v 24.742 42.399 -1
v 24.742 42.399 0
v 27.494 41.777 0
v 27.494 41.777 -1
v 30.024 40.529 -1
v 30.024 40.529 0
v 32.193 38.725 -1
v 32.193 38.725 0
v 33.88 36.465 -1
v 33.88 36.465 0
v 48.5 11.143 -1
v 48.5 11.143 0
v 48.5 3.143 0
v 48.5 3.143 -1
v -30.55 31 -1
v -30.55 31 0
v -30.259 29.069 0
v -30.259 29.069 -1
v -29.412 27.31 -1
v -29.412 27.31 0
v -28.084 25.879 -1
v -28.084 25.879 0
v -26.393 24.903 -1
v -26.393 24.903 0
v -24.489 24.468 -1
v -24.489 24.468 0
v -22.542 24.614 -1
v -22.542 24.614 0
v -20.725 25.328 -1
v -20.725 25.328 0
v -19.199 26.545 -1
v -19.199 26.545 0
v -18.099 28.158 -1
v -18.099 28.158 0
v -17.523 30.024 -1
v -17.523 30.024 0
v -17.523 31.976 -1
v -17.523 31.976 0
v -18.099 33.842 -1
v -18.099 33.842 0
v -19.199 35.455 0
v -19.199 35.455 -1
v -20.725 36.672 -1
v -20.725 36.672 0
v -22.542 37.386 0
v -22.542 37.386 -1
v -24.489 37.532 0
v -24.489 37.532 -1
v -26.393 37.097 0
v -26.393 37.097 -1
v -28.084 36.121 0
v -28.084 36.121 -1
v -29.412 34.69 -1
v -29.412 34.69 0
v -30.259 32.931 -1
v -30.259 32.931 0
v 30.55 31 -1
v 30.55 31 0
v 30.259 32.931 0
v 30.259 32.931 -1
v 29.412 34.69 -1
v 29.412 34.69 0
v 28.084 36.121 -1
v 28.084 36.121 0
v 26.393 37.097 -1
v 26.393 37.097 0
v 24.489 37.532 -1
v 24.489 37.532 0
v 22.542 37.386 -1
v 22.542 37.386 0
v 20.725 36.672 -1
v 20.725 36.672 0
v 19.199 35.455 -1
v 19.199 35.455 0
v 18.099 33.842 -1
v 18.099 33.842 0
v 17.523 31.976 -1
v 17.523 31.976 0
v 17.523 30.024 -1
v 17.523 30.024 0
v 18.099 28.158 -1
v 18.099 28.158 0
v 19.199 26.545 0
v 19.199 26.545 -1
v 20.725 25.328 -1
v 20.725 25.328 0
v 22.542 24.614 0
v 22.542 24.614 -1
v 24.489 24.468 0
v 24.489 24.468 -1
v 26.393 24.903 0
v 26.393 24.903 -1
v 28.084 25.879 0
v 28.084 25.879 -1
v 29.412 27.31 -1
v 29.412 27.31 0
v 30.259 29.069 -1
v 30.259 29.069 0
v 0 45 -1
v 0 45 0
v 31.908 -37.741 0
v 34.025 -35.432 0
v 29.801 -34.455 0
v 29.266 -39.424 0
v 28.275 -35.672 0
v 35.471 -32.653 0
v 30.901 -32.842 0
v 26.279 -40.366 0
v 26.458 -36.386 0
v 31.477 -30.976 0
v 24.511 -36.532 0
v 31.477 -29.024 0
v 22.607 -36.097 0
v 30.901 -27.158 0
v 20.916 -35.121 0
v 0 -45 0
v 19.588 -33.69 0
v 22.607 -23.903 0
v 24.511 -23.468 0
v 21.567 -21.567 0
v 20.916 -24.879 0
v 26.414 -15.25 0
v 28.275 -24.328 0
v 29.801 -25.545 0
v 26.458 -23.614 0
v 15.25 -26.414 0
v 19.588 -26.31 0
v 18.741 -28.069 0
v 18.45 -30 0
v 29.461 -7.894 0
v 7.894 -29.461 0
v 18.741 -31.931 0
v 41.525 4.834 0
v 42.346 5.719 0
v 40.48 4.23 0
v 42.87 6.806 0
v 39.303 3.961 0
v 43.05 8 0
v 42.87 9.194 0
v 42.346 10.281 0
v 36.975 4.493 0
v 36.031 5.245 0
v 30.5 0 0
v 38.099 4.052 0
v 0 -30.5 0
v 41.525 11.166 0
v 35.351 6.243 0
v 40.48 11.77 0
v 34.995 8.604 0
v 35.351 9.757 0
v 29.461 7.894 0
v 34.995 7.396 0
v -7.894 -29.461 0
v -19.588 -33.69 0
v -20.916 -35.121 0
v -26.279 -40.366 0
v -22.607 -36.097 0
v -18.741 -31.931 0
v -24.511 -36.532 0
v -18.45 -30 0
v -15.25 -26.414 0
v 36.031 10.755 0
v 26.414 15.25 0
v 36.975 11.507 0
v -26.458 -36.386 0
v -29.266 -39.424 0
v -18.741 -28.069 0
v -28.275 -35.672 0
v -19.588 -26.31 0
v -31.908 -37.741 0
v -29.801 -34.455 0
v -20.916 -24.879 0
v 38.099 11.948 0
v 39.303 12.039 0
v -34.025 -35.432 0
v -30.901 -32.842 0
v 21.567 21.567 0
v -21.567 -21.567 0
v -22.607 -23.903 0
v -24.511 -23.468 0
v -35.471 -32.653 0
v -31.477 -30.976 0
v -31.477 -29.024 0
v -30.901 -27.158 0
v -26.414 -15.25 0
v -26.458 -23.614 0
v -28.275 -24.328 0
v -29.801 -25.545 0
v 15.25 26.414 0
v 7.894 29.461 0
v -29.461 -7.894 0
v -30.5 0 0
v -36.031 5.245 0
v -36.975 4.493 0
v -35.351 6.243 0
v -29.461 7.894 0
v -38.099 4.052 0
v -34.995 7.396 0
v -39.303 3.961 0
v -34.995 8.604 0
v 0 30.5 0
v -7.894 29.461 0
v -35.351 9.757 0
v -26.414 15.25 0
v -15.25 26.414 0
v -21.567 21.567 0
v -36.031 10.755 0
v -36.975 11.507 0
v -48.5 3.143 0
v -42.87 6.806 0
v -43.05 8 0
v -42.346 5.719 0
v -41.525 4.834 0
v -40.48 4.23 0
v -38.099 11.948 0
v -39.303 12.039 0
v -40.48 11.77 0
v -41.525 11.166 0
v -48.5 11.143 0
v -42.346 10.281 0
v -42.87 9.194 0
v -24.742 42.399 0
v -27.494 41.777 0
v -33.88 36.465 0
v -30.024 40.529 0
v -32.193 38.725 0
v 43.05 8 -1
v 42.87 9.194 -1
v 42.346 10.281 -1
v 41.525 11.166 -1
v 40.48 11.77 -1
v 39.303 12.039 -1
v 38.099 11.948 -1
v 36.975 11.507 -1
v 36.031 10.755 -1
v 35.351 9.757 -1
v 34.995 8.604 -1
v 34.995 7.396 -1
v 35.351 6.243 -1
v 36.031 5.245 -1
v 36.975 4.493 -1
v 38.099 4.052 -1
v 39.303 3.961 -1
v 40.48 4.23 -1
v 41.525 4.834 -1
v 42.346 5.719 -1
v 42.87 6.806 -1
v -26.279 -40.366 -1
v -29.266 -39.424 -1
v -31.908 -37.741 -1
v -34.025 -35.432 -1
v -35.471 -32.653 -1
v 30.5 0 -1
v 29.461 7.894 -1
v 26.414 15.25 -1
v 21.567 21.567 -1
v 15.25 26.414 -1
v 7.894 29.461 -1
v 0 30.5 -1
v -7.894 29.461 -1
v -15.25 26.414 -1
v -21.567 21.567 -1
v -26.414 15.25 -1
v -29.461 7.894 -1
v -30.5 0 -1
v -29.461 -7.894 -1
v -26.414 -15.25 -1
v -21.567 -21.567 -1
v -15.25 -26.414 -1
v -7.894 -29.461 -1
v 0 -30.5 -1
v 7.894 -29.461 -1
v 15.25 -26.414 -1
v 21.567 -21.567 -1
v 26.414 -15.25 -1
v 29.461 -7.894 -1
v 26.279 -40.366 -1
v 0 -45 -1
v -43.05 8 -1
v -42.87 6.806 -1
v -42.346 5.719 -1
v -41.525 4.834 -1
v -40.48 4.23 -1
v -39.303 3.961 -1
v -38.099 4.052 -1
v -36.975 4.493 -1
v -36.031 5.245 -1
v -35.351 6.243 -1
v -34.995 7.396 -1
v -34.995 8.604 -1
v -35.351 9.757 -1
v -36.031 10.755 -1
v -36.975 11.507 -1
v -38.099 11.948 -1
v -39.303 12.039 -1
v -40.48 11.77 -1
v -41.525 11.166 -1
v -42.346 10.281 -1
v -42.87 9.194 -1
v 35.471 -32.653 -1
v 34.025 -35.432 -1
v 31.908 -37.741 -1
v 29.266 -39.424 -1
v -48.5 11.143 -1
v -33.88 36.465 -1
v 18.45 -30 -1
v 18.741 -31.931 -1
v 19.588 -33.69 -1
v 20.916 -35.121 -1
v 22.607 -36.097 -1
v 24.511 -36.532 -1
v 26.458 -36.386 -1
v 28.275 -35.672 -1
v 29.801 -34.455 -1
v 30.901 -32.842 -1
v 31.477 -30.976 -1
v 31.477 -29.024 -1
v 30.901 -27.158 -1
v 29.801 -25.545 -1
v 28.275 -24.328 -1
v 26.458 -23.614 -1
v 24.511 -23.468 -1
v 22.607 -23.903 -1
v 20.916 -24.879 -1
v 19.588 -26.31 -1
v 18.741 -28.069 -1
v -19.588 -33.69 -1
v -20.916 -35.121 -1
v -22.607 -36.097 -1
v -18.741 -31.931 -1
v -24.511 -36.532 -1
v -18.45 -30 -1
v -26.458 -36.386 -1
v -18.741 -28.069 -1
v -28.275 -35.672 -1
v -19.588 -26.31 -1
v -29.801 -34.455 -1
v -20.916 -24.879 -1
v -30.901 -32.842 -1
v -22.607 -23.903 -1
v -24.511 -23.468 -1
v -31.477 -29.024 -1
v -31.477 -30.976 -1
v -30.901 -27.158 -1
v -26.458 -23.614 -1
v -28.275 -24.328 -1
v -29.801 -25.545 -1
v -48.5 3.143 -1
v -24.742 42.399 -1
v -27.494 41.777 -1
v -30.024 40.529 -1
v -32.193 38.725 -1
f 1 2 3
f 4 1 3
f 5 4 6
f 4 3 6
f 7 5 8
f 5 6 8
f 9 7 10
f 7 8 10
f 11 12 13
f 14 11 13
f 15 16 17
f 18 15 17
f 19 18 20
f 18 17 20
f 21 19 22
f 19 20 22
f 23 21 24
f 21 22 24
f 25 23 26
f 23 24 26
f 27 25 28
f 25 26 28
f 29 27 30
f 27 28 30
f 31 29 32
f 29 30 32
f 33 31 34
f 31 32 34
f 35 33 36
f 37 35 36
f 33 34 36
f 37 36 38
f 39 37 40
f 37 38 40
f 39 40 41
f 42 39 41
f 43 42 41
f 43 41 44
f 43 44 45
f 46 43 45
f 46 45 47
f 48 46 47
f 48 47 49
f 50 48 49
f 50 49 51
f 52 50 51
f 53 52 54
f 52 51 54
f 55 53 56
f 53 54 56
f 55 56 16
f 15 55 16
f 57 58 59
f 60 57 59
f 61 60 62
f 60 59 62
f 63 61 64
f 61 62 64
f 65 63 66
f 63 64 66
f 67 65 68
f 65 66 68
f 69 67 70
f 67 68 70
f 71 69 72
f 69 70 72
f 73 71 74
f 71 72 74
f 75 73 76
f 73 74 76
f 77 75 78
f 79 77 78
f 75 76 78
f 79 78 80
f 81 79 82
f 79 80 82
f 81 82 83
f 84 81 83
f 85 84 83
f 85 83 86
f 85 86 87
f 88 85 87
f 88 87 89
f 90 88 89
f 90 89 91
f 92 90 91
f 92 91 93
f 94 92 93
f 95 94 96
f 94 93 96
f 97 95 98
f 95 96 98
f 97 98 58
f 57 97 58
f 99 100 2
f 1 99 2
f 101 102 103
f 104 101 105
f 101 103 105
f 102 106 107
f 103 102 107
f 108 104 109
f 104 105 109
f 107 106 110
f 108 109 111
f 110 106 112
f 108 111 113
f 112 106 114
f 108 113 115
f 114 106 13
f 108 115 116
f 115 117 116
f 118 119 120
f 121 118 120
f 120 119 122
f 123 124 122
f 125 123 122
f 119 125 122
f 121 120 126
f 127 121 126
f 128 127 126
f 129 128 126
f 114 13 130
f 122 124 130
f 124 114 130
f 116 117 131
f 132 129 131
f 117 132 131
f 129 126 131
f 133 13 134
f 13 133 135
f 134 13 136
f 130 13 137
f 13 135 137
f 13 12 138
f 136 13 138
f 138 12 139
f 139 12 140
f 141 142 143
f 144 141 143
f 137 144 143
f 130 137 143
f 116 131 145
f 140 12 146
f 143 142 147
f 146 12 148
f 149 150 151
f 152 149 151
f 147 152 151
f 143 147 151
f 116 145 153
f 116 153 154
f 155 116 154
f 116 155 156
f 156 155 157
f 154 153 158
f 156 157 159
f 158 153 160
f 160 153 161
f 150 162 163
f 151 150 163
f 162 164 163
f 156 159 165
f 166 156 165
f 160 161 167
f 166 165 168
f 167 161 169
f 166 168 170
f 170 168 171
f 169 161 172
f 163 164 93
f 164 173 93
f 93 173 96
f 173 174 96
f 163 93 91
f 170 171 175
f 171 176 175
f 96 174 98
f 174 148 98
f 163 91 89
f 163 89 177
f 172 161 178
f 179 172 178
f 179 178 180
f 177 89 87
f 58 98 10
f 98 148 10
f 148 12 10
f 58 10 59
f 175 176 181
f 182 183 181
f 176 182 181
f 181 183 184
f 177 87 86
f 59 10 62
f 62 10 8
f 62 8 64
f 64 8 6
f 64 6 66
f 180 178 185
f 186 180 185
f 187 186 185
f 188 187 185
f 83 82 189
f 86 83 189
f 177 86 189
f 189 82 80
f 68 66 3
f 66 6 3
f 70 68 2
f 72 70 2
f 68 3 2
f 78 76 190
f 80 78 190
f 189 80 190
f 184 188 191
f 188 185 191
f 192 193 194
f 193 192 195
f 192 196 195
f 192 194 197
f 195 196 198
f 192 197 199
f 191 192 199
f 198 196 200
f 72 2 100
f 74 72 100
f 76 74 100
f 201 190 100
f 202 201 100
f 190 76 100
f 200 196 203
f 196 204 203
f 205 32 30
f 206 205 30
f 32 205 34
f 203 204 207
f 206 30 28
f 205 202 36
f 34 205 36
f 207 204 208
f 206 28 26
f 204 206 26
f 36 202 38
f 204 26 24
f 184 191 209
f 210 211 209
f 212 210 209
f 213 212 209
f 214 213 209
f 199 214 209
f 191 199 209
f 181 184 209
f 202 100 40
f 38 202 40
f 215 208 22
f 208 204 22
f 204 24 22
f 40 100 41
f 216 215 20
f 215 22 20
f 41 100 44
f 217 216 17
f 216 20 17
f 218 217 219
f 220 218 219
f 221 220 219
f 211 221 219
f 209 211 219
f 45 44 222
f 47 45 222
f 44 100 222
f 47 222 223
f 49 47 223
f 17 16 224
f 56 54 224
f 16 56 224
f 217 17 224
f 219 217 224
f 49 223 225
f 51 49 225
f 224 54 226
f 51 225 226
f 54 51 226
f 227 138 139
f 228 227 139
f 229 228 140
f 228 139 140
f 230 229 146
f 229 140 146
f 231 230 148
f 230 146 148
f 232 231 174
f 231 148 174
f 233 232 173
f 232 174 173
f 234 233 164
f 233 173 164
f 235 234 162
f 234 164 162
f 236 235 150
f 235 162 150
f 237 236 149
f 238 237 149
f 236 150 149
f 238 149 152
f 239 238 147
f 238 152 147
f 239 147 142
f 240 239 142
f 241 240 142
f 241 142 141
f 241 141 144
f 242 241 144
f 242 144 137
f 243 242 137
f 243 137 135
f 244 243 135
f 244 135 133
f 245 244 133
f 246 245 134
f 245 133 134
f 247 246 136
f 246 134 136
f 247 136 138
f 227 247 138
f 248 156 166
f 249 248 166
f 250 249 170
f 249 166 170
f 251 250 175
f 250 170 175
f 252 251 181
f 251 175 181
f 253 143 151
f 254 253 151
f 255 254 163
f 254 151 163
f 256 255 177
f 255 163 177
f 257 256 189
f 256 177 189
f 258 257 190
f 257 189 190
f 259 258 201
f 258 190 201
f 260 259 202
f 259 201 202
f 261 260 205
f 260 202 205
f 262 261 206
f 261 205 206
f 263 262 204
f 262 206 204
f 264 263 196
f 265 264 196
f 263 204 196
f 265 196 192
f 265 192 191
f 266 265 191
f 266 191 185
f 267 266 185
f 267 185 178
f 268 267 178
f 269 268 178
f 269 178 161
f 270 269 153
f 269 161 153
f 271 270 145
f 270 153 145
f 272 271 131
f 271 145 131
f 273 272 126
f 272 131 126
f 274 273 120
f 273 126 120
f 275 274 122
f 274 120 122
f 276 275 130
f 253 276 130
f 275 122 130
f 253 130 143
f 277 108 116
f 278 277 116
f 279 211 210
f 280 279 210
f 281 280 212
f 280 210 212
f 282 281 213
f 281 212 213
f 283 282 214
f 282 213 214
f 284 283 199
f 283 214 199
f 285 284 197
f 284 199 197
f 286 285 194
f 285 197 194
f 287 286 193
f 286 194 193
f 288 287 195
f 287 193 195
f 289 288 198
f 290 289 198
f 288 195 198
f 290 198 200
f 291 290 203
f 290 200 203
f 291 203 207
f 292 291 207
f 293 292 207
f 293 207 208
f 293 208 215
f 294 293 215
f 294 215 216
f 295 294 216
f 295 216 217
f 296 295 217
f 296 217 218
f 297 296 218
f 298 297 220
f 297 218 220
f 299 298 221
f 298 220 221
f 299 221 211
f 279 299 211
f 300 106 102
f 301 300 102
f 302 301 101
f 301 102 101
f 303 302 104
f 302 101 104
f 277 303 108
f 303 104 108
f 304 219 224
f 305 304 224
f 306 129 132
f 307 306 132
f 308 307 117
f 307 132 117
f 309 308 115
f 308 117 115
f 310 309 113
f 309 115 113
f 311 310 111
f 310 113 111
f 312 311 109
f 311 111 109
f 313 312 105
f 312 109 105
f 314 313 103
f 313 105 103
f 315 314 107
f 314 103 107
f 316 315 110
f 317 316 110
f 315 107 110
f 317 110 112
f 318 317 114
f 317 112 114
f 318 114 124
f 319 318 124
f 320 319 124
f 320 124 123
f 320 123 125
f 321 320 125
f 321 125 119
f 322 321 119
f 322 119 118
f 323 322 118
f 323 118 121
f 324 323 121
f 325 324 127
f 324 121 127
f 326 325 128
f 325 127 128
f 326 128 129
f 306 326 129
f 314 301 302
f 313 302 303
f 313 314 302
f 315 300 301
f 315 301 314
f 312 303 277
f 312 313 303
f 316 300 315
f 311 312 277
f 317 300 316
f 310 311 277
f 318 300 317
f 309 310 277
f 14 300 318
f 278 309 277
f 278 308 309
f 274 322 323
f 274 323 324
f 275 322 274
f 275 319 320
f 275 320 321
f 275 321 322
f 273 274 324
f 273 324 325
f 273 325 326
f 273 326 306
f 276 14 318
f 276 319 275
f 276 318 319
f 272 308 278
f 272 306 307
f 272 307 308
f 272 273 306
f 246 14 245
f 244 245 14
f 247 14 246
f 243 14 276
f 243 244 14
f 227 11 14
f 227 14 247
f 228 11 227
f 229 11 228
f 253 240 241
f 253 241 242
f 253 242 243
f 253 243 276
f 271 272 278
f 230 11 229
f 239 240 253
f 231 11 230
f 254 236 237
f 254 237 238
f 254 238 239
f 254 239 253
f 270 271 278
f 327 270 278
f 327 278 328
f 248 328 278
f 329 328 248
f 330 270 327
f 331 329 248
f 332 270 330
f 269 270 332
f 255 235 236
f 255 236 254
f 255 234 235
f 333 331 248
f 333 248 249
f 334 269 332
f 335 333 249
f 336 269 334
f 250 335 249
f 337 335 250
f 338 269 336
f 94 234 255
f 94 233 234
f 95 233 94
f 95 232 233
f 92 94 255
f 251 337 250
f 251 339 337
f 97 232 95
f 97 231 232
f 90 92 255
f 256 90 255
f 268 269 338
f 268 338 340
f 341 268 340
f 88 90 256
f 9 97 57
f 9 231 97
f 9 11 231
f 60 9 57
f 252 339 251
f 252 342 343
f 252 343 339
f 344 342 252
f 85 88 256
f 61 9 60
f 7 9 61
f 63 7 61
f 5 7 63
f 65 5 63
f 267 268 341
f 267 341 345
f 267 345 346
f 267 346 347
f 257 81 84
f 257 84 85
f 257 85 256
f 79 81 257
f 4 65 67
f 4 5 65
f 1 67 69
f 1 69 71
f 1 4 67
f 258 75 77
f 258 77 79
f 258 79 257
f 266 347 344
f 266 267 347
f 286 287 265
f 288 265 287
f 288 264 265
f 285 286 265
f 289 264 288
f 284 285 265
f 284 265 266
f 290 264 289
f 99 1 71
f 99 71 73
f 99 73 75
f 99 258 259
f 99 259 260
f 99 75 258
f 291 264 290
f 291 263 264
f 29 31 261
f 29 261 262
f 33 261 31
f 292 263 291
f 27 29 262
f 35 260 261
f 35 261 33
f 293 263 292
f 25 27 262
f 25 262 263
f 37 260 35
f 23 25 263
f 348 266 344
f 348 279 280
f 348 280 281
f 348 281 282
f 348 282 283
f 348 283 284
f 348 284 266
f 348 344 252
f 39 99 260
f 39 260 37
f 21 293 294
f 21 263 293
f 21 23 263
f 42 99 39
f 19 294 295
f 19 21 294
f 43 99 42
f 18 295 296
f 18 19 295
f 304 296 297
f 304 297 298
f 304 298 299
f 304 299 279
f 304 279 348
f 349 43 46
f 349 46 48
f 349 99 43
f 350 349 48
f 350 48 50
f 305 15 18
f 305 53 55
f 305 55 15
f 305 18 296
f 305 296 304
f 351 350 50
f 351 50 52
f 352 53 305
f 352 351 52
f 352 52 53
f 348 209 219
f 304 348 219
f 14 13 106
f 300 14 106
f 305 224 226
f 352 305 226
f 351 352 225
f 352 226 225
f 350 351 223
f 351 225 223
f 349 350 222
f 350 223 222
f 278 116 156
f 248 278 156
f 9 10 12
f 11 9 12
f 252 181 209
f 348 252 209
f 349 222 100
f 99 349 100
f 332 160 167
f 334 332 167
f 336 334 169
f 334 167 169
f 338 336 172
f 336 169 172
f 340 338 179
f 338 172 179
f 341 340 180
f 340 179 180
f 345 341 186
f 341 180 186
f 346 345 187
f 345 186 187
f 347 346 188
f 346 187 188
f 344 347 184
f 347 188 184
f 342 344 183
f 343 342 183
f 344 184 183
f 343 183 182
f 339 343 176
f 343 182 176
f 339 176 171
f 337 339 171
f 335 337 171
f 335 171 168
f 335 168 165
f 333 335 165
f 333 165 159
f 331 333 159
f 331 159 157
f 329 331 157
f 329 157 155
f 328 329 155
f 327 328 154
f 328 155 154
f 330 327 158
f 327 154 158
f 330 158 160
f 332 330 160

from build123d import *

# Parameters (mm, degrees)
SKETCH1_R           = 30.5
SKETCH1_R_2         = 6.55
SKETCH1_R_3         = 4.05
BOSS_EXTRUDE1_DEPTH = 1


with BuildPart() as part:
    # Sketch1 → Boss-Extrude1 (new body)
    with BuildSketch(Plane.XY):
        with BuildLine():
            Line((0, 45), (24.742465391, 42.399462096))
            ThreePointArc((24.742465391, 42.399462096), (30.023792252, 40.529246167), (33.880428677, 36.465199352))
            Line((33.880428677, 36.465199352), (48.5, 11.143359036))
            Line((48.5, 11.143359036), (48.5, 3.143359036))
            Line((48.5, 3.143359036), (35.471224905, -32.652906339))
            ThreePointArc((35.471224905, -32.652906339), (31.908364772, -37.741197937), (26.278691588, -40.366357655))
            Line((26.278691588, -40.366357655), (0, -45))
            Line((0, -45), (-26.278691588, -40.366357655))
            ThreePointArc((-26.278691588, -40.366357655), (-31.908364772, -37.741197937), (-35.471224905, -32.652906339))
            Line((-35.471224905, -32.652906339), (-48.5, 3.143359036))
            Line((-48.5, 3.143359036), (-48.5, 11.143359036))
            Line((-48.5, 11.143359036), (-33.880428677, 36.465199352))
            ThreePointArc((-33.880428677, 36.465199352), (-30.023792252, 40.529246167), (-24.742465391, 42.399462096))
            Line((-24.742465391, 42.399462096), (0, 45))
        make_face()
        Circle(SKETCH1_R, mode=Mode.SUBTRACT)
        with Locations((24, 31)):
            Circle(SKETCH1_R_2, mode=Mode.SUBTRACT)
        with Locations(Location((-24, 31, 0), (0, 0, 180))):
            Circle(SKETCH1_R_2, mode=Mode.SUBTRACT)
        with Locations((-25, -30)):
            Circle(SKETCH1_R_2, mode=Mode.SUBTRACT)
        with Locations(Location((25, -30, 0), (0, 0, 180))):
            Circle(SKETCH1_R_2, mode=Mode.SUBTRACT)
        with Locations((39, 8)):
            Circle(SKETCH1_R_3, mode=Mode.SUBTRACT)
        with Locations(Location((-39, 8, 0), (0, 0, 180))):
            Circle(SKETCH1_R_3, mode=Mode.SUBTRACT)
    extrude(amount=-BOSS_EXTRUDE1_DEPTH)


solid = part.part
